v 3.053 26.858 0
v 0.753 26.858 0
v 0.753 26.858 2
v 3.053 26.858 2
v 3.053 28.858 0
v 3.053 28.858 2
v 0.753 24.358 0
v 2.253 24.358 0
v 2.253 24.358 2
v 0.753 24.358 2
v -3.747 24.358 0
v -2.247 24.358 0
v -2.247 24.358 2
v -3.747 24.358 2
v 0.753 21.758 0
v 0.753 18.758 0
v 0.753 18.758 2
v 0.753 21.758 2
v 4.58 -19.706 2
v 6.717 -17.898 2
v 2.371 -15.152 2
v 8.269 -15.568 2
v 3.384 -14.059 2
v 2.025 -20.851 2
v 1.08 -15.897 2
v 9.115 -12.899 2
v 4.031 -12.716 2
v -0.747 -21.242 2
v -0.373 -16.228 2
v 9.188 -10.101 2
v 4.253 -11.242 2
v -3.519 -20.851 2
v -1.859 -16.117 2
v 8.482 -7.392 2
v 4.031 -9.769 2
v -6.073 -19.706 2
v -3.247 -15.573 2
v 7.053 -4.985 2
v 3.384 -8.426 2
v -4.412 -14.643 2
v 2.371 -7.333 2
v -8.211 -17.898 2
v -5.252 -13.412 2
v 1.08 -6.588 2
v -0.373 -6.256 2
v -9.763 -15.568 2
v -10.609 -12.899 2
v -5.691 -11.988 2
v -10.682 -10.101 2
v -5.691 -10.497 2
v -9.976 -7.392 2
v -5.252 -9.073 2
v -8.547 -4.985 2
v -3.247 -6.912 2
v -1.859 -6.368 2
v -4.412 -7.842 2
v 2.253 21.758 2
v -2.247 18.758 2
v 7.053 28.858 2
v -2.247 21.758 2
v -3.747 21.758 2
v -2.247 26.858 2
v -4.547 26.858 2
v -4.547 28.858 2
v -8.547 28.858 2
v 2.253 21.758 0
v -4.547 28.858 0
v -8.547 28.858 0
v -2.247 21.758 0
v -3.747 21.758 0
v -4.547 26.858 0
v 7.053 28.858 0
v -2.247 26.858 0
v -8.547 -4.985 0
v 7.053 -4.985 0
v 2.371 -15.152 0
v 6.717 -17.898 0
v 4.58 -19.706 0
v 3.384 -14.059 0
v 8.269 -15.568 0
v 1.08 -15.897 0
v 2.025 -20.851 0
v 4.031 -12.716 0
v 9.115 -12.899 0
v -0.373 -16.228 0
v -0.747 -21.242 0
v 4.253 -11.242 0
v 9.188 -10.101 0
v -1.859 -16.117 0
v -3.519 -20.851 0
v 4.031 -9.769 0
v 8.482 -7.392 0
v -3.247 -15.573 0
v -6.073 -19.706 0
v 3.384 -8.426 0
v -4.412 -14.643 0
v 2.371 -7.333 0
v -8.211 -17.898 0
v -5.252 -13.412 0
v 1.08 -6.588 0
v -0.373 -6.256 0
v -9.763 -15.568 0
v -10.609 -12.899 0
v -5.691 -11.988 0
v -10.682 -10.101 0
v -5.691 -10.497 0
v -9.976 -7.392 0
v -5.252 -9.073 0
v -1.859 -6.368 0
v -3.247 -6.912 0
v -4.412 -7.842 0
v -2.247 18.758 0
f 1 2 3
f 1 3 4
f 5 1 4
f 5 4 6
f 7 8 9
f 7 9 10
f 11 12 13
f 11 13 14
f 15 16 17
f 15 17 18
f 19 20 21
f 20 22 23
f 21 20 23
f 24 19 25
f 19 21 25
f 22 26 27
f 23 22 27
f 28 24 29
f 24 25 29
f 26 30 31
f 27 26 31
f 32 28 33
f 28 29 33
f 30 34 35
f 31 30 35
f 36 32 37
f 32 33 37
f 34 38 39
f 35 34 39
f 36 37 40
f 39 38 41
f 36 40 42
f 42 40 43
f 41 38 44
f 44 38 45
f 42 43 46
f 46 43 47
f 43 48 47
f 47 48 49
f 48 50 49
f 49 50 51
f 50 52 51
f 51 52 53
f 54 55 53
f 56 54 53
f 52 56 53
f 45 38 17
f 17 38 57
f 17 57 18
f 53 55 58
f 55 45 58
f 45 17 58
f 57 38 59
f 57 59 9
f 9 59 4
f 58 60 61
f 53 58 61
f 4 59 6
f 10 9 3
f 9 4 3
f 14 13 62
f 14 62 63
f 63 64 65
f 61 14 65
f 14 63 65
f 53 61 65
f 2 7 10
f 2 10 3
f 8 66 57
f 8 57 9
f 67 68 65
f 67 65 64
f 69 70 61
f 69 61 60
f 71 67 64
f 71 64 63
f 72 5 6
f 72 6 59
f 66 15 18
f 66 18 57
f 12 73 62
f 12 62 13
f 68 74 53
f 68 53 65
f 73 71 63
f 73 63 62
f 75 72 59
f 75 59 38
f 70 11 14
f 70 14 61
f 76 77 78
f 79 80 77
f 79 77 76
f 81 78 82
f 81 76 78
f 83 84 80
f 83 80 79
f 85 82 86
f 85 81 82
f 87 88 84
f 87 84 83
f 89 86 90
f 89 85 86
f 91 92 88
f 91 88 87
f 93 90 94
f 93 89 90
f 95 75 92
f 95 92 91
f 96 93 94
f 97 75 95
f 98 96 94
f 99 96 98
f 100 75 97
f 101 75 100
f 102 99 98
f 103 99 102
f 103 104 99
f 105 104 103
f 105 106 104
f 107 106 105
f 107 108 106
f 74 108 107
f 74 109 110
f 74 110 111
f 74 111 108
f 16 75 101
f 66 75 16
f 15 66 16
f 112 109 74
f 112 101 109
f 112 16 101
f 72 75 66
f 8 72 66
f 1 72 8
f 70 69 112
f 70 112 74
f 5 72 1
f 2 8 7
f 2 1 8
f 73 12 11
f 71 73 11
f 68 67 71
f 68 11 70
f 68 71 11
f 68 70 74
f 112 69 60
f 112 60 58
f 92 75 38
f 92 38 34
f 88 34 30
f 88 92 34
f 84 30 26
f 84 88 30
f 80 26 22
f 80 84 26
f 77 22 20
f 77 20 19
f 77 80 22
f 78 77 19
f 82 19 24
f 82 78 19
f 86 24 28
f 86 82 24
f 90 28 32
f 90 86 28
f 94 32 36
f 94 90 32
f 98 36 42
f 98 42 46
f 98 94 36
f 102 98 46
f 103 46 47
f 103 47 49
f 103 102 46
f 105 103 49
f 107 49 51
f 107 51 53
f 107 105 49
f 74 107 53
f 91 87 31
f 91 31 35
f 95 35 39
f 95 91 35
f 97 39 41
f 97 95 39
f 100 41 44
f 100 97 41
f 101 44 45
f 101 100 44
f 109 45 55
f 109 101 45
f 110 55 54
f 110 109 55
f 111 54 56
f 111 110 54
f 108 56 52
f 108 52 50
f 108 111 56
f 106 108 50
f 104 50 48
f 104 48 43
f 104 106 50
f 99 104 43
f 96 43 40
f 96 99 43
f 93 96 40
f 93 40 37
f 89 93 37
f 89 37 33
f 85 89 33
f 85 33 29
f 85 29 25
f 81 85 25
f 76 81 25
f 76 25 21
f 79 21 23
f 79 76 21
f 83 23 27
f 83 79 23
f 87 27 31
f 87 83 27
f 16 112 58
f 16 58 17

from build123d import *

# Parameters (mm, degrees)
SKETCH_1_R      = 5
EXTRUDE_1_DEPTH = 2


with BuildPart() as part:
    # 草图1 → 凸台-拉伸1 (new body)
    with BuildSketch(Plane.XY):
        with BuildLine():
            Line((0.753104923, 26.857612039), (3.053104923, 26.857612039))
            Line((3.053104923, 26.857612039), (3.053104923, 28.857612039))
            Line((3.053104923, 28.857612039), (7.053104923, 28.857612039))
            Line((7.053104923, 28.857612039), (7.053104923, -4.984592822))
            ThreePointArc((7.053104923, -4.984592822), (-0.746895077, -21.242387961), (-8.546895077, -4.984592822))
            Line((-8.546895077, -4.984592822), (-8.546895077, 28.857612039))
            Line((-8.546895077, 28.857612039), (-4.546895077, 28.857612039))
            Line((-4.546895077, 28.857612039), (-4.546895077, 26.857612039))
            Line((-4.546895077, 26.857612039), (-2.246895077, 26.857612039))
            Line((-2.246895077, 26.857612039), (-2.246895077, 24.357612039))
            Line((-2.246895077, 24.357612039), (-3.746895077, 24.357612039))
            Line((-3.746895077, 24.357612039), (-3.746895077, 21.757612039))
            Line((-3.746895077, 21.757612039), (-2.246895077, 21.757612039))
            Line((-2.246895077, 21.757612039), (-2.246895077, 18.757612039))
            Line((-2.246895077, 18.757612039), (0.753104923, 18.757612039))
            Line((0.753104923, 18.757612039), (0.753104923, 21.757612039))
            Line((0.753104923, 21.757612039), (2.253104923, 21.757612039))
            Line((2.253104923, 21.757612039), (2.253104923, 24.357612039))
            Line((2.253104923, 24.357612039), (0.753104923, 24.357612039))
            Line((0.753104923, 24.357612039), (0.753104923, 26.857612039))
        make_face()
        with Locations((-0.746895077, -11.242387961)):
            Circle(SKETCH_1_R, mode=Mode.SUBTRACT)
    extrude(amount=EXTRUDE_1_DEPTH)


solid = part.part
